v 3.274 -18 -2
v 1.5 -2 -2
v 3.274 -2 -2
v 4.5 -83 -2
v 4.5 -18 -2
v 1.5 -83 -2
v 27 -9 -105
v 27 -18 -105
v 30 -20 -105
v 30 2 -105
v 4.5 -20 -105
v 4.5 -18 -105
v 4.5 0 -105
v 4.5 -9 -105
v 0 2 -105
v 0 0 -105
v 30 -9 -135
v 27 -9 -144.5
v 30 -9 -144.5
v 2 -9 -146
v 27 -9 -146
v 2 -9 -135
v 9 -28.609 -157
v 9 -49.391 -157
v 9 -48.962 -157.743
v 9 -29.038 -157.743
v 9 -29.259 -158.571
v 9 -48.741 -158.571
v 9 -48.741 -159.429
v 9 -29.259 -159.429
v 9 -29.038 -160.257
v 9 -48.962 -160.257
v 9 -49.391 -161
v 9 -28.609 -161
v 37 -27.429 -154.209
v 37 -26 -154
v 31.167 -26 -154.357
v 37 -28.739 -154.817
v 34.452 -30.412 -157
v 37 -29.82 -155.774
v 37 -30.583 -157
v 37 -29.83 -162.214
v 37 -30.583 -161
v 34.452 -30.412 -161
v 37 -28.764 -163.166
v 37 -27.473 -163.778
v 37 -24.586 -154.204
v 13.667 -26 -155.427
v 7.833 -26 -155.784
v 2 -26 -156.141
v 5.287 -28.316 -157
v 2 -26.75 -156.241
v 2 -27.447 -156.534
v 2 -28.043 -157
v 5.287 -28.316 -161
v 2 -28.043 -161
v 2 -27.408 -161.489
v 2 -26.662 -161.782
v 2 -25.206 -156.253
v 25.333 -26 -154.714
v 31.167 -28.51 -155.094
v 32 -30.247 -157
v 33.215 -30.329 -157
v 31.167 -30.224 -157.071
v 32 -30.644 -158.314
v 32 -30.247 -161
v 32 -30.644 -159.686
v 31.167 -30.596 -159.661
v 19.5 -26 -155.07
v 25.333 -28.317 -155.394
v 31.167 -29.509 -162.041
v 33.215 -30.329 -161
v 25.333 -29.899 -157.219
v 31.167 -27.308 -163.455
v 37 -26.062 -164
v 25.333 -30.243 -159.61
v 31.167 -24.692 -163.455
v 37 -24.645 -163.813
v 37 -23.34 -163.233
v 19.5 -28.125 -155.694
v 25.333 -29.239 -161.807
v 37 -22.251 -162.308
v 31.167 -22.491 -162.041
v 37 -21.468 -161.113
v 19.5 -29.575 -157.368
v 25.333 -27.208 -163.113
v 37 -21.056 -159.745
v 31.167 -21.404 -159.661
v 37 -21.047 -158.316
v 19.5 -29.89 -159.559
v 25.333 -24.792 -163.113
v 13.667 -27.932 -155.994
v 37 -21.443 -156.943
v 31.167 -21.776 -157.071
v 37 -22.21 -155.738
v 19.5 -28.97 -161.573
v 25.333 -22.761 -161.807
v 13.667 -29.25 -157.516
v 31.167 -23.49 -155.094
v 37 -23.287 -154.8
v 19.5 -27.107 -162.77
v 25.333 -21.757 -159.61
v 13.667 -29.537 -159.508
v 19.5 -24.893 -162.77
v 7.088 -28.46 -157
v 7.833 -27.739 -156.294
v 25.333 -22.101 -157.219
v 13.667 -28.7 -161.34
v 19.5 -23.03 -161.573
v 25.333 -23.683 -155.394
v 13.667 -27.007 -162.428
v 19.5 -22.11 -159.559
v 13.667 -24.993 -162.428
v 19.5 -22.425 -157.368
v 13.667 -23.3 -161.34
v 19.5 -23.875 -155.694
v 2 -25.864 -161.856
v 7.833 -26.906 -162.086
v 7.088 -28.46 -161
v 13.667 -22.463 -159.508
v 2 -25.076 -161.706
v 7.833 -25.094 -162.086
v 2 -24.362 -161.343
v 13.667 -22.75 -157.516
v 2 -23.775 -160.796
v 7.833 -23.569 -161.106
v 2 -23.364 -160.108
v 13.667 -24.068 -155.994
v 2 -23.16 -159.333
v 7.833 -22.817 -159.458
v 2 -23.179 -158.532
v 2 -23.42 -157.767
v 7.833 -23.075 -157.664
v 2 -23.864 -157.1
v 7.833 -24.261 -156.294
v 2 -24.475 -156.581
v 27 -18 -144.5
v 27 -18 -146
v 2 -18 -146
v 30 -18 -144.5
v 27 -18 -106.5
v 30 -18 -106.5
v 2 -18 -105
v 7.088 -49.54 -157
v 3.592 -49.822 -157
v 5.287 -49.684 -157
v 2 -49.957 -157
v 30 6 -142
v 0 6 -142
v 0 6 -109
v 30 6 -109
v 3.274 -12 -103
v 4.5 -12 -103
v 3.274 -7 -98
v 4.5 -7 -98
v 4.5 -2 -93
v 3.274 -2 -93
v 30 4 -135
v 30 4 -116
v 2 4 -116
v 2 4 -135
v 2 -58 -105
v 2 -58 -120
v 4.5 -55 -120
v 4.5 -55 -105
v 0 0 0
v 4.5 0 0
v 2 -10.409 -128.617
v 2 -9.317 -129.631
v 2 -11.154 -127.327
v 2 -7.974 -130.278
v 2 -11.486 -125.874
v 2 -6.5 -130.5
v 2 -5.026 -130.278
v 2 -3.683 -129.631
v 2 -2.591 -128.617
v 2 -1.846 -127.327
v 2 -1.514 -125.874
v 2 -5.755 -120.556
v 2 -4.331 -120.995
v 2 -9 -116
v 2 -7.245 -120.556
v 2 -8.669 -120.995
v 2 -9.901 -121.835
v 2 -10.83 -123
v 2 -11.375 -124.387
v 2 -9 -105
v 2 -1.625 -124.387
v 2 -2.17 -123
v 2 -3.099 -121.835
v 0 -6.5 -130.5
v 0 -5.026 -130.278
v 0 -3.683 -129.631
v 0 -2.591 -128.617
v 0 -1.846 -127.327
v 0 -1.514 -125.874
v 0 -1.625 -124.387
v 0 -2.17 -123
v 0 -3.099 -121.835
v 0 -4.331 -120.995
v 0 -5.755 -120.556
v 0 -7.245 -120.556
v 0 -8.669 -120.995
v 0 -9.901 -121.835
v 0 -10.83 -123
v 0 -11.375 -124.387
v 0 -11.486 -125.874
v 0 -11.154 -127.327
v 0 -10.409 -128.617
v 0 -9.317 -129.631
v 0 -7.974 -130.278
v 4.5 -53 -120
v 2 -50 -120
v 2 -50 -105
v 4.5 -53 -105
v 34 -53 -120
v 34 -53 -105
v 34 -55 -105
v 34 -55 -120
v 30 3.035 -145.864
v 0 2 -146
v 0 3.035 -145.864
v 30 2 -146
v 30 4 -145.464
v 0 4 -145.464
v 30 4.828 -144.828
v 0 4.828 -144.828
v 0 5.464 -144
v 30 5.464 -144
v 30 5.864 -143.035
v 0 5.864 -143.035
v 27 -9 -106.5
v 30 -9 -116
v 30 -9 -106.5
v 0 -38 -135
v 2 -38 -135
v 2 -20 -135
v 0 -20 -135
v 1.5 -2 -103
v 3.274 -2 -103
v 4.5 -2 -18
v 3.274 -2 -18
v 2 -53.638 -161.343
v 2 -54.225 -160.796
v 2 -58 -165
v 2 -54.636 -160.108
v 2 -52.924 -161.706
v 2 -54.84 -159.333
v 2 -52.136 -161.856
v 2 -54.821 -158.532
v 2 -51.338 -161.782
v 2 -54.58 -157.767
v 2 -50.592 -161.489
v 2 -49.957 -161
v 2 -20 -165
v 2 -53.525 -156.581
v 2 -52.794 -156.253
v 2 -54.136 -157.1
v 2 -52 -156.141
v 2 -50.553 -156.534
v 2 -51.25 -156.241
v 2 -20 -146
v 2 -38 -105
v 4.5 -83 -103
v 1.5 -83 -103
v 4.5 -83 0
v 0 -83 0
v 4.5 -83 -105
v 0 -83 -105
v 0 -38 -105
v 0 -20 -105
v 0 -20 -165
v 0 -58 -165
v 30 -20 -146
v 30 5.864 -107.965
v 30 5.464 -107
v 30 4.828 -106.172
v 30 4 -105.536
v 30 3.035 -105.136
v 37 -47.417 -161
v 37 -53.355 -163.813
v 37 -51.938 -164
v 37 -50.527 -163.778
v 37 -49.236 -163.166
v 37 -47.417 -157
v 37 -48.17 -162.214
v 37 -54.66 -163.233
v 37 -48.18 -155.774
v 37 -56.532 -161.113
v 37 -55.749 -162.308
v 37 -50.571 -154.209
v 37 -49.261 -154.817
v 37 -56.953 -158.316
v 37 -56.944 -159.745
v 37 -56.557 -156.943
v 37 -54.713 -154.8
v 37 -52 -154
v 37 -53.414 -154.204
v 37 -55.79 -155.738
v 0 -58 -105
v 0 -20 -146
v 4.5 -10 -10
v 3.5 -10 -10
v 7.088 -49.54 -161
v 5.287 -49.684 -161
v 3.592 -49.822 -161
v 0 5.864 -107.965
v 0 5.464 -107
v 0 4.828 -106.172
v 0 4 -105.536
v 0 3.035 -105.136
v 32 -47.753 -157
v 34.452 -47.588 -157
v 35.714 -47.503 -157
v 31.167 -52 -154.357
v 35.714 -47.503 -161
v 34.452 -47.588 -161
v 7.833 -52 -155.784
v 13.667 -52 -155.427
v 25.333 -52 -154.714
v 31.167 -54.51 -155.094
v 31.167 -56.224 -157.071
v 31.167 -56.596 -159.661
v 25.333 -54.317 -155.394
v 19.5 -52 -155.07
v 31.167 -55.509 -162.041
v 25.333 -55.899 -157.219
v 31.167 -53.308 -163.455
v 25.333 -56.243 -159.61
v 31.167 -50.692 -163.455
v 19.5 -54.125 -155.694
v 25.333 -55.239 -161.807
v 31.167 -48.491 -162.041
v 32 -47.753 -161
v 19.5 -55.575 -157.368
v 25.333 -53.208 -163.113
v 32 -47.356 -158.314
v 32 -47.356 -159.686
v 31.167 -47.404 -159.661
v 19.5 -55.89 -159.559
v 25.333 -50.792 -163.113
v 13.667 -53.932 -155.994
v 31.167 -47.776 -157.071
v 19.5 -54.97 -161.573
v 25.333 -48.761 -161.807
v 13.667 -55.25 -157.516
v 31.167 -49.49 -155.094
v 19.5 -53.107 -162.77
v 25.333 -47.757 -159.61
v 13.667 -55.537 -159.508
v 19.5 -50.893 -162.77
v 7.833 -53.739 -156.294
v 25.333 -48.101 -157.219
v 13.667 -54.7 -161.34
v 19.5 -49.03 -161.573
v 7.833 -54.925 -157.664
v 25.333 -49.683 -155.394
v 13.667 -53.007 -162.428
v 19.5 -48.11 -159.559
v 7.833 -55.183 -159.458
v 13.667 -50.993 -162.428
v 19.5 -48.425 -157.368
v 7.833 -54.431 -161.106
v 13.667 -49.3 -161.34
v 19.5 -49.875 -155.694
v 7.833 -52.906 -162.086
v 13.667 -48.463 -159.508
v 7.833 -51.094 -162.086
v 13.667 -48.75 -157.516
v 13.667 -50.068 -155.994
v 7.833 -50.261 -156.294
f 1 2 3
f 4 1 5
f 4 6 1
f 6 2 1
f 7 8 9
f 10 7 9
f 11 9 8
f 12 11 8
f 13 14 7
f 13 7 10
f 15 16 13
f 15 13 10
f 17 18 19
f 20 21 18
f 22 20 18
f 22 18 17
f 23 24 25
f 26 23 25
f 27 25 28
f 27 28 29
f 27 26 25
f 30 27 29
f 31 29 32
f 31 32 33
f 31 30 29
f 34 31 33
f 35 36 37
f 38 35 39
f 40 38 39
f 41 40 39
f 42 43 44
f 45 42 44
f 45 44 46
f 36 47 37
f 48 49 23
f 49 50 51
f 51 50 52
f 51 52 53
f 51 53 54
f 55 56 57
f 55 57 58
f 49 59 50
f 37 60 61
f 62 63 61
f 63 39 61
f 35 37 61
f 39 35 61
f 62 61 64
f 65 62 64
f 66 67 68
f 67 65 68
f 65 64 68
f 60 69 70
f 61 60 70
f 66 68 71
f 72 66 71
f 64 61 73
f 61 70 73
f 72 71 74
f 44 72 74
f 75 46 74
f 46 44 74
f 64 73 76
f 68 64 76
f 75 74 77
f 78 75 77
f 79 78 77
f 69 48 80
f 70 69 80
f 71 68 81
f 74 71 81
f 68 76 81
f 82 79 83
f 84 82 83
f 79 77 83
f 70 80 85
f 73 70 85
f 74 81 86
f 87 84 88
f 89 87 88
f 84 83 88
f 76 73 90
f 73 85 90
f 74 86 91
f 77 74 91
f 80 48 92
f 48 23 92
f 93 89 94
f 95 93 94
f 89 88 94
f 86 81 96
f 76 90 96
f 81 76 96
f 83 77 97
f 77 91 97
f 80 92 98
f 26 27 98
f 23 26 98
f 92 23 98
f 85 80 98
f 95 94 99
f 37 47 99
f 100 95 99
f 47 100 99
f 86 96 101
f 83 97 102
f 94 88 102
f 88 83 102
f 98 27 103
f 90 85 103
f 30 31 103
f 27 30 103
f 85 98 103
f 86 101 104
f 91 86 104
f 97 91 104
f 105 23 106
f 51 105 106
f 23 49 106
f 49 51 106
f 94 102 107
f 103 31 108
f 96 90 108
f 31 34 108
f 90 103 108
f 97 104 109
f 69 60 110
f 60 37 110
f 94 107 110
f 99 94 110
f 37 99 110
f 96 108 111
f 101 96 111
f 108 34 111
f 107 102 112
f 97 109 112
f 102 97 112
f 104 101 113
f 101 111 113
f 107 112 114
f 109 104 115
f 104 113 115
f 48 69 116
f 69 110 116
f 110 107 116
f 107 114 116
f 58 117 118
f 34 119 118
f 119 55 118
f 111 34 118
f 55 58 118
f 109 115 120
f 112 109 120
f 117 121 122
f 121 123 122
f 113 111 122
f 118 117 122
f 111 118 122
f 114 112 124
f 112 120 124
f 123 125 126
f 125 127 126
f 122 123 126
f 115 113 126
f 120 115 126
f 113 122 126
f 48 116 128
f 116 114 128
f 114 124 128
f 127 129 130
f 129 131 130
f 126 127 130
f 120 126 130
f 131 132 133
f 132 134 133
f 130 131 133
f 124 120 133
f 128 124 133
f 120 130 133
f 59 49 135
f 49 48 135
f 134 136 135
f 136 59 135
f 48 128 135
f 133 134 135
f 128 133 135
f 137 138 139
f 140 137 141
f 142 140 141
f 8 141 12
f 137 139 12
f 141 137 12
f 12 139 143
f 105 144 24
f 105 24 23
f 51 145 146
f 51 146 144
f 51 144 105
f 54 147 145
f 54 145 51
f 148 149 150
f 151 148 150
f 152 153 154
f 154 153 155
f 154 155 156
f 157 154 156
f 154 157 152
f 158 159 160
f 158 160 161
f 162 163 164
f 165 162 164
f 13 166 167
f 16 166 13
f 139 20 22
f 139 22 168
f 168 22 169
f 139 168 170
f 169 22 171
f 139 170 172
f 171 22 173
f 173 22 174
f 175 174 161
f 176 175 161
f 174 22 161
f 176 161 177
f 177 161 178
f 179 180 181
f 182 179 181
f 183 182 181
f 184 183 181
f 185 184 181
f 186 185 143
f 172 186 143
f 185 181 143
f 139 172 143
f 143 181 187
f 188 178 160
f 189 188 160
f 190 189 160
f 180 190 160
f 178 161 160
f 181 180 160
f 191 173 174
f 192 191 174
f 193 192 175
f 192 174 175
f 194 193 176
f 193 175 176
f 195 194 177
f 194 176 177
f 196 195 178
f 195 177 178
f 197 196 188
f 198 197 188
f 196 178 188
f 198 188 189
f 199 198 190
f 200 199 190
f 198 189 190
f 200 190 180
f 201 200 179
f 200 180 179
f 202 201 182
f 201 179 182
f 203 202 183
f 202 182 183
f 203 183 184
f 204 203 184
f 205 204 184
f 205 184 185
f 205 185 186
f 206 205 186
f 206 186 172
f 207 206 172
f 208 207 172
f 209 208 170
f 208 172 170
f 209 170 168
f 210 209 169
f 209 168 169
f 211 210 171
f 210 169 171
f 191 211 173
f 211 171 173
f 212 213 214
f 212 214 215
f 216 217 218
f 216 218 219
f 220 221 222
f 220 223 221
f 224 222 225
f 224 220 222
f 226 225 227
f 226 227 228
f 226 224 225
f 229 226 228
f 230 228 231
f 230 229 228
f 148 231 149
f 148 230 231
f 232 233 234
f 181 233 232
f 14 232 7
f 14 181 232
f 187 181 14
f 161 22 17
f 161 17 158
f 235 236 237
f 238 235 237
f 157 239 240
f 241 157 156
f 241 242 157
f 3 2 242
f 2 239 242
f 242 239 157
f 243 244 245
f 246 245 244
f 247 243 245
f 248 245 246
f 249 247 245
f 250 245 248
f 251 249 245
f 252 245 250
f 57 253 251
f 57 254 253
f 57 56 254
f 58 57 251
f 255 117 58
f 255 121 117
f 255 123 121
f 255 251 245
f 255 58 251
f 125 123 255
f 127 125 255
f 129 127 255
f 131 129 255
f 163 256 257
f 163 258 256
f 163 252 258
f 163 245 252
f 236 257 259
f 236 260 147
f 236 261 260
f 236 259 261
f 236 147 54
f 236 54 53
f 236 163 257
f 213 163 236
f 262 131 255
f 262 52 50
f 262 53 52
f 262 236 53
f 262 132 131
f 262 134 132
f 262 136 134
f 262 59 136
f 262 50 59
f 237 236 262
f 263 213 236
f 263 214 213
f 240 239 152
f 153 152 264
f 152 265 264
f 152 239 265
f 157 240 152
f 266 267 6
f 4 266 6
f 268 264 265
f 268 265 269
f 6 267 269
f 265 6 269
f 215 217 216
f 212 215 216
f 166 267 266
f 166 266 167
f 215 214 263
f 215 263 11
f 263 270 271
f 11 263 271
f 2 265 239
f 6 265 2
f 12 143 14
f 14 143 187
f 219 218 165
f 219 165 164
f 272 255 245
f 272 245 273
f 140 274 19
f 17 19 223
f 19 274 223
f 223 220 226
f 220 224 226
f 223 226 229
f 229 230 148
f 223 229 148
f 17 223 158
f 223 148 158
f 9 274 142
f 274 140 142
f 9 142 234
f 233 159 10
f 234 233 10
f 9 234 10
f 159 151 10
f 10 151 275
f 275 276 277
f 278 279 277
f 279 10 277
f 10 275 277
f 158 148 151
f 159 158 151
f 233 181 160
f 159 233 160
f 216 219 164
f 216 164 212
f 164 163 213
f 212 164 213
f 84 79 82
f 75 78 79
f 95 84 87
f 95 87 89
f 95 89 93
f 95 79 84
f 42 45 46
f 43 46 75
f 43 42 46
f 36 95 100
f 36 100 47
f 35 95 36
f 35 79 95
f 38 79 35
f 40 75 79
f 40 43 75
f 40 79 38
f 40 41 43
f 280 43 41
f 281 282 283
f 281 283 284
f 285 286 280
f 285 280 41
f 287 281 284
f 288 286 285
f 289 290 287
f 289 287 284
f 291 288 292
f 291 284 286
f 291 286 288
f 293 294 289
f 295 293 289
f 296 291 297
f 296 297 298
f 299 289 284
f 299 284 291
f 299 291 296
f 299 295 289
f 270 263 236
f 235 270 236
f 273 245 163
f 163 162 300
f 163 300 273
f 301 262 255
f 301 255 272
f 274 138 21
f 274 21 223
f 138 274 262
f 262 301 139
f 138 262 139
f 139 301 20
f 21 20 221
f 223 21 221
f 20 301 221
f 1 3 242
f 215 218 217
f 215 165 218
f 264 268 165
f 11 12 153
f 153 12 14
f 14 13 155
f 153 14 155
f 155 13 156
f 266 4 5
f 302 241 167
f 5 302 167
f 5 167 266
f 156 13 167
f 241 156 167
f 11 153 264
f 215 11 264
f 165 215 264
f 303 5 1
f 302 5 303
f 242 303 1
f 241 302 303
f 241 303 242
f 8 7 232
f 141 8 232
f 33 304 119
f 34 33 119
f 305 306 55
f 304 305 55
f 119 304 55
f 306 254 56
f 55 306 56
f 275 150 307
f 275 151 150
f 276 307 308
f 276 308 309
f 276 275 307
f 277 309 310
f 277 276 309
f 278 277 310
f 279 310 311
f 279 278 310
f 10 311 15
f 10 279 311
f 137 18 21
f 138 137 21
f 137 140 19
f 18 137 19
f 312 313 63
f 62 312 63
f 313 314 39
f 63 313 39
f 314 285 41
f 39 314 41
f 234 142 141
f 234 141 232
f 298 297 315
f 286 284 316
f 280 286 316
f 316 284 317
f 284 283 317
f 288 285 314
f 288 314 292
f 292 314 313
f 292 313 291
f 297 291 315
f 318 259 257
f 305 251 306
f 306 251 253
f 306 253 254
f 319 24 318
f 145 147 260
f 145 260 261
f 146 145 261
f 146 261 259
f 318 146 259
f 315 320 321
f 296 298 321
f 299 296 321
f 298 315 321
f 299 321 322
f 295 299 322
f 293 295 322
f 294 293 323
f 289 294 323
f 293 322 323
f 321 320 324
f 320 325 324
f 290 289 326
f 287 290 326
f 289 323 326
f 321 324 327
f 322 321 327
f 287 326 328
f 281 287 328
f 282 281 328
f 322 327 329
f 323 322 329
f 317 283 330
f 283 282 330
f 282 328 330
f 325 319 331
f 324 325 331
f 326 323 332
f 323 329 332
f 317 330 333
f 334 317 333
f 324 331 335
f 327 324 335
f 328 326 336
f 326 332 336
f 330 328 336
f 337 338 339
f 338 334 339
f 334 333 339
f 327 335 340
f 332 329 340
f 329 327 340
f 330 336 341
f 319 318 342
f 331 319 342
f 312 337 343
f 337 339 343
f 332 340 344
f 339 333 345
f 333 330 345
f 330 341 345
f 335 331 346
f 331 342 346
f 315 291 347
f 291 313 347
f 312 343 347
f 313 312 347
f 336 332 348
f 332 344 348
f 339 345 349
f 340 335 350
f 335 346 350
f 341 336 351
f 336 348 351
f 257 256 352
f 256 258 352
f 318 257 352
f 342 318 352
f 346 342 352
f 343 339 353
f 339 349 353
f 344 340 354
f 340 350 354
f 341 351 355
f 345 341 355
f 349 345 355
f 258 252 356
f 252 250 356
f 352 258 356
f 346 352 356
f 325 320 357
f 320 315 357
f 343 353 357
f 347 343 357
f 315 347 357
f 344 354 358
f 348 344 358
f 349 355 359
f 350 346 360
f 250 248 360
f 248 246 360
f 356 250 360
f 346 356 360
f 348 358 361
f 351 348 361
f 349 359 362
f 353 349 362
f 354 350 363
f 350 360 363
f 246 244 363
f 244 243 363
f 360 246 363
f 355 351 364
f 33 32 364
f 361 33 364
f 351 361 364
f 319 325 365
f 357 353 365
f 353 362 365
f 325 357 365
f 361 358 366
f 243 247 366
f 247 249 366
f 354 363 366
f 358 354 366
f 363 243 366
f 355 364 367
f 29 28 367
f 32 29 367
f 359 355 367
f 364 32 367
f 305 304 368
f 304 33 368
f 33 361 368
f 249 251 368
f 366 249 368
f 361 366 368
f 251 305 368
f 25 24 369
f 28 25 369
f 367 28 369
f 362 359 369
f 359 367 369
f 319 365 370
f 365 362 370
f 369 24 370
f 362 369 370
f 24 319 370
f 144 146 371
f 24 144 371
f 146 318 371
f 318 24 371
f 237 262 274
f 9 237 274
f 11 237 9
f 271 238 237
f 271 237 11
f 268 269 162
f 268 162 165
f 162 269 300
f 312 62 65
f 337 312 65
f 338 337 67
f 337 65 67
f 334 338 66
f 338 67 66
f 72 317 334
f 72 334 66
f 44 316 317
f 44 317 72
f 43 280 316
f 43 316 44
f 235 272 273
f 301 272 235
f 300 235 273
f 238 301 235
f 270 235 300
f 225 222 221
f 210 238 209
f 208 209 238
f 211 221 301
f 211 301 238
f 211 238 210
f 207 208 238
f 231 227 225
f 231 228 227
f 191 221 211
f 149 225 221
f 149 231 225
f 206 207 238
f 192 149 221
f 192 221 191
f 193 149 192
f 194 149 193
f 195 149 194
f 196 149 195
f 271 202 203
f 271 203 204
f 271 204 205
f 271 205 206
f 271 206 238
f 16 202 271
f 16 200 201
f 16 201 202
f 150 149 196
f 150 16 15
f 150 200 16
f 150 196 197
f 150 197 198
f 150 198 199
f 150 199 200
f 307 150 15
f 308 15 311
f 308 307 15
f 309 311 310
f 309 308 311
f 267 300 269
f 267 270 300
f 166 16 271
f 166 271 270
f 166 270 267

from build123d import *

# Parameters (mm, degrees)
SKETCH6_W            = 105
SKETCH6_H            = 83
BOSS_EXTRUDE3_DEPTH  = 4.5
SKETCH9_W            = 3
SKETCH9_H            = 101
CUT_EXTRUDE6_DEPTH   = 81
SKETCH10_W           = 1
SKETCH10_H           = 8
BOSS_EXTRUDE4_DEPTH  = 8
SKETCH11_W           = 1.226225524
SKETCH11_H           = 5
BOSS_EXTRUDE5_DEPTH  = 5
BOSS_EXTRUDE12_DEPTH = 1.226226
SKETCH27_W           = 15
SKETCH27_H           = 2
SKETCH27_W_2         = 41
SKETCH27_W_3         = 11
SKETCH27_H_2         = 15
BOSS_EXTRUDE20_DEPTH = 30
SKETCH28_W           = 1.5
SKETCH28_H           = 11
BOSS_EXTRUDE21_DEPTH = 3
SKETCH29_W           = 41
SKETCH29_H           = 2
BOSS_EXTRUDE22_DEPTH = 30
SKETCH30_W           = 2
SKETCH30_H           = 38
BOSS_EXTRUDE23_DEPTH = 60
SKETCH31_R           = 5
BOSS_EXTRUDE24_DEPTH = 35
DRAFT1_ANGLE         = -3.5
DRAFT3_ANGLE         = -3.5
SKETCH32_W           = 4
SKETCH32_H           = 28
BOSS_EXTRUDE25_DEPTH = 7
SKETCH33_W           = 4
SKETCH33_H           = 26
BOSS_EXTRUDE26_DEPTH = 5
SKETCH39_W           = 41
SKETCH39_H           = 24
BOSS_EXTRUDE30_DEPTH = 2
SKETCH40_R           = 5
CUT_EXTRUDE9_DEPTH   = 2
BOSS_EXTRUDE31_DEPTH = 15
SKETCH42_W           = 15
SKETCH42_H           = 2
BOSS_EXTRUDE32_DEPTH = 4
SKETCH45_W           = 30
SKETCH45_H           = 18
CUT_EXTRUDE10_DEPTH  = 5
FILLET1_R            = 4
FILLET2_R            = 4


with BuildPart() as part:
    # Sketch6 → Boss-Extrude3 (new body)
    with BuildSketch(Plane(origin=(0, 0, 0), x_dir=(0, 0, -1), z_dir=(1, 0, 0))):
        with Locations((52.5, -41.5)):
            Rectangle(SKETCH6_W, SKETCH6_H)
    extrude(amount=BOSS_EXTRUDE3_DEPTH)

    # Sketch9 → Cut-Extrude6 (cut)
    with BuildSketch(Plane.XZ.offset(83)):
        with Locations((3, -52.5)):
            Rectangle(SKETCH9_W, SKETCH9_H)
    extrude(amount=-CUT_EXTRUDE6_DEPTH, mode=Mode.SUBTRACT)

    # Sketch10 → Boss-Extrude4 (add)
    with BuildSketch(Plane(origin=(0, 0, -2), x_dir=(-1, 0, 0), z_dir=(0, 0, -1))):
        with Locations((-4, -6)):
            Rectangle(SKETCH10_W, SKETCH10_H)
    extrude(amount=BOSS_EXTRUDE4_DEPTH)

    # Sketch11 → Boss-Extrude5 (add)
    with BuildSketch(Plane.XY.offset(-103)):
        with Locations((3.886887238, -4.5)):
            Rectangle(SKETCH11_W, SKETCH11_H)
    extrude(amount=BOSS_EXTRUDE5_DEPTH)

    # Sketch18 → Boss-Extrude12 (add)
    with BuildSketch(Plane(origin=(4.5, 0, 0), x_dir=(0, 0, -1), z_dir=(1, 0, 0))):
        Polygon((103, -12), (93, -2), (103, -2), align=None)
        Polygon((18, -2), (2, -2), (2, -18), align=None)
    extrude(amount=-BOSS_EXTRUDE12_DEPTH)

    # Sketch27 → Boss-Extrude20 (add)
    with BuildSketch(Plane.ZY):
        with Locations((-112.5, -54)):
            Rectangle(SKETCH27_W, SKETCH27_H)
        with Locations((-125.5, -19)):
            Rectangle(SKETCH27_W_2, SKETCH27_H)
        with Locations((-110.5, -1.5)):
            Rectangle(SKETCH27_W_3, SKETCH27_H_2)
        with Locations((-140.5, -1.5)):
            Rectangle(SKETCH27_W_3, SKETCH27_H_2)
    extrude(amount=-BOSS_EXTRUDE20_DEPTH)


with BuildPart() as boss_extrude20_piece_1:
    # of the separate pieces the step leaves, piece 1, a body of its own (boss_extrude20_pieces)
    add(part.part.solids().sort_by_distance((0, 0, 0))[0])



with BuildPart() as boss_extrude20_piece_2:
    # of the separate pieces the step leaves, piece 2, a body of its own (boss_extrude20_pieces)
    add(part.part.solids().sort_by_distance((0, 6, -146))[0])


with BuildPart() as boss_extrude20_piece_1_1:
    add(boss_extrude20_piece_1.part)

    add(boss_extrude20_piece_2.part)  # Boss-Extrude21 merges Boss-Extrude20 piece 2
    # Sketch28 → Boss-Extrude21 (add)
    with BuildSketch(Plane(origin=(30, 0, 0), x_dir=(0, 0, -1), z_dir=(1, 0, 0))):
        with Locations((145.25, -14.5)):
            Rectangle(SKETCH28_W, SKETCH28_H)
        with Locations((105.75, -14.5)):
            Rectangle(SKETCH28_W, SKETCH28_H)
    extrude(amount=-BOSS_EXTRUDE21_DEPTH)

    # Sketch29 → Boss-Extrude22 (add)
    with BuildSketch(Plane(origin=(30, 0, 0), x_dir=(0, 0, -1), z_dir=(1, 0, 0))):
        with Locations((125.5, 5)):
            Rectangle(SKETCH29_W, SKETCH29_H)
    extrude(amount=-BOSS_EXTRUDE22_DEPTH)

    # Sketch30 → Boss-Extrude23 (add)
    with BuildSketch(Plane(origin=(0, 0, -105), x_dir=(-1, 0, 0), z_dir=(0, 0, -1))):
        with Locations((-1, -39)):
            Rectangle(SKETCH30_W, SKETCH30_H)
    extrude(amount=BOSS_EXTRUDE23_DEPTH)

    # Sketch31 → Boss-Extrude24 (add)
    with BuildSketch(Plane(origin=(2, 0, 0), x_dir=(0, 0, -1), z_dir=(1, 0, 0))):
        with Locations(Location((159, -52, 0), (0, 0, 180))):
            Circle(SKETCH31_R)
        with Locations(Location((159, -26, 0), (0, 0, 180))):
            Circle(SKETCH31_R)
    extrude(amount=BOSS_EXTRUDE24_DEPTH)

    # Draft1
    draft1_faces = [boss_extrude20_piece_1_1.faces().sort_by_distance(p)[0] for p in [
        (19.5, -52, -164),
    ]]
    draft(draft1_faces, Plane(origin=(37, -52, -159), x_dir=(0, 0, 1), z_dir=(1, 0, 0)), DRAFT1_ANGLE)

    # Draft3
    draft3_faces = [boss_extrude20_piece_1_1.faces().sort_by_distance(p)[0] for p in [
        (19.5, -26, -164),
    ]]
    draft(draft3_faces, Plane(origin=(37, -26, -159), x_dir=(0, 0, 1), z_dir=(1, 0, 0)), DRAFT3_ANGLE)

    # Sketch32 → Boss-Extrude25 (add)
    with BuildSketch(Plane(origin=(2, 0, 0), x_dir=(0, 0, -1), z_dir=(1, 0, 0))):
        with Locations((159, -39)):
            Rectangle(SKETCH32_W, SKETCH32_H)
    extrude(amount=BOSS_EXTRUDE25_DEPTH)

    # Sketch33 → Boss-Extrude26 (add)
    with BuildSketch(Plane(origin=(37, 0, 0), x_dir=(0, 0, -1), z_dir=(1, 0, 0))):
        with Locations((159, -39)):
            Rectangle(SKETCH33_W, SKETCH33_H)
    extrude(amount=-BOSS_EXTRUDE26_DEPTH)

    # Sketch39 → Boss-Extrude30 (add)
    with BuildSketch(Plane.ZY):
        with Locations((-125.5, -6)):
            Rectangle(SKETCH39_W, SKETCH39_H)
    extrude(amount=-BOSS_EXTRUDE30_DEPTH)

    # Sketch40 → Cut-Extrude9 (cut)
    with BuildSketch(Plane(origin=(2, 0, 0), x_dir=(0, 0, -1), z_dir=(1, 0, 0))):
        with Locations((125.5, -6.5)):
            Circle(SKETCH40_R)
    extrude(amount=-CUT_EXTRUDE9_DEPTH, mode=Mode.SUBTRACT)

    # Sketch41 → Boss-Extrude31 (add)
    with BuildSketch(Plane(origin=(0, 0, -120), x_dir=(-1, 0, 0), z_dir=(0, 0, -1))):
        Polygon((-2, -55), (-2, -58), (-4.5, -55), align=None)
        Polygon((-2, -50), (-4.5, -53), (-2, -53), align=None)
    extrude(amount=-BOSS_EXTRUDE31_DEPTH)

    # Sketch42 → Boss-Extrude32 (add)
    with BuildSketch(Plane(origin=(30, 0, 0), x_dir=(0, 0, -1), z_dir=(1, 0, 0))):
        with Locations((112.5, -54)):
            Rectangle(SKETCH42_W, SKETCH42_H)
    extrude(amount=BOSS_EXTRUDE32_DEPTH)

    # Sketch45 → Cut-Extrude10 (cut)
    with BuildSketch(Plane(origin=(2, 0, 0), x_dir=(0, 0, -1), z_dir=(1, 0, 0))):
        with Locations((120, -29)):
            Rectangle(SKETCH45_W, SKETCH45_H)
    extrude(amount=-CUT_EXTRUDE10_DEPTH, mode=Mode.SUBTRACT)

    # Fillet1
    fillet1_edges = [boss_extrude20_piece_1_1.edges().sort_by_distance(p)[0] for p in [
        (15, 6, -146),
    ]]
    fillet(fillet1_edges, radius=FILLET1_R)

    # Fillet2
    fillet2_edges = [boss_extrude20_piece_1_1.edges().sort_by_distance(p)[0] for p in [
        (15, 6, -105),
    ]]
    fillet(fillet2_edges, radius=FILLET2_R)


solid = boss_extrude20_piece_1_1.part
